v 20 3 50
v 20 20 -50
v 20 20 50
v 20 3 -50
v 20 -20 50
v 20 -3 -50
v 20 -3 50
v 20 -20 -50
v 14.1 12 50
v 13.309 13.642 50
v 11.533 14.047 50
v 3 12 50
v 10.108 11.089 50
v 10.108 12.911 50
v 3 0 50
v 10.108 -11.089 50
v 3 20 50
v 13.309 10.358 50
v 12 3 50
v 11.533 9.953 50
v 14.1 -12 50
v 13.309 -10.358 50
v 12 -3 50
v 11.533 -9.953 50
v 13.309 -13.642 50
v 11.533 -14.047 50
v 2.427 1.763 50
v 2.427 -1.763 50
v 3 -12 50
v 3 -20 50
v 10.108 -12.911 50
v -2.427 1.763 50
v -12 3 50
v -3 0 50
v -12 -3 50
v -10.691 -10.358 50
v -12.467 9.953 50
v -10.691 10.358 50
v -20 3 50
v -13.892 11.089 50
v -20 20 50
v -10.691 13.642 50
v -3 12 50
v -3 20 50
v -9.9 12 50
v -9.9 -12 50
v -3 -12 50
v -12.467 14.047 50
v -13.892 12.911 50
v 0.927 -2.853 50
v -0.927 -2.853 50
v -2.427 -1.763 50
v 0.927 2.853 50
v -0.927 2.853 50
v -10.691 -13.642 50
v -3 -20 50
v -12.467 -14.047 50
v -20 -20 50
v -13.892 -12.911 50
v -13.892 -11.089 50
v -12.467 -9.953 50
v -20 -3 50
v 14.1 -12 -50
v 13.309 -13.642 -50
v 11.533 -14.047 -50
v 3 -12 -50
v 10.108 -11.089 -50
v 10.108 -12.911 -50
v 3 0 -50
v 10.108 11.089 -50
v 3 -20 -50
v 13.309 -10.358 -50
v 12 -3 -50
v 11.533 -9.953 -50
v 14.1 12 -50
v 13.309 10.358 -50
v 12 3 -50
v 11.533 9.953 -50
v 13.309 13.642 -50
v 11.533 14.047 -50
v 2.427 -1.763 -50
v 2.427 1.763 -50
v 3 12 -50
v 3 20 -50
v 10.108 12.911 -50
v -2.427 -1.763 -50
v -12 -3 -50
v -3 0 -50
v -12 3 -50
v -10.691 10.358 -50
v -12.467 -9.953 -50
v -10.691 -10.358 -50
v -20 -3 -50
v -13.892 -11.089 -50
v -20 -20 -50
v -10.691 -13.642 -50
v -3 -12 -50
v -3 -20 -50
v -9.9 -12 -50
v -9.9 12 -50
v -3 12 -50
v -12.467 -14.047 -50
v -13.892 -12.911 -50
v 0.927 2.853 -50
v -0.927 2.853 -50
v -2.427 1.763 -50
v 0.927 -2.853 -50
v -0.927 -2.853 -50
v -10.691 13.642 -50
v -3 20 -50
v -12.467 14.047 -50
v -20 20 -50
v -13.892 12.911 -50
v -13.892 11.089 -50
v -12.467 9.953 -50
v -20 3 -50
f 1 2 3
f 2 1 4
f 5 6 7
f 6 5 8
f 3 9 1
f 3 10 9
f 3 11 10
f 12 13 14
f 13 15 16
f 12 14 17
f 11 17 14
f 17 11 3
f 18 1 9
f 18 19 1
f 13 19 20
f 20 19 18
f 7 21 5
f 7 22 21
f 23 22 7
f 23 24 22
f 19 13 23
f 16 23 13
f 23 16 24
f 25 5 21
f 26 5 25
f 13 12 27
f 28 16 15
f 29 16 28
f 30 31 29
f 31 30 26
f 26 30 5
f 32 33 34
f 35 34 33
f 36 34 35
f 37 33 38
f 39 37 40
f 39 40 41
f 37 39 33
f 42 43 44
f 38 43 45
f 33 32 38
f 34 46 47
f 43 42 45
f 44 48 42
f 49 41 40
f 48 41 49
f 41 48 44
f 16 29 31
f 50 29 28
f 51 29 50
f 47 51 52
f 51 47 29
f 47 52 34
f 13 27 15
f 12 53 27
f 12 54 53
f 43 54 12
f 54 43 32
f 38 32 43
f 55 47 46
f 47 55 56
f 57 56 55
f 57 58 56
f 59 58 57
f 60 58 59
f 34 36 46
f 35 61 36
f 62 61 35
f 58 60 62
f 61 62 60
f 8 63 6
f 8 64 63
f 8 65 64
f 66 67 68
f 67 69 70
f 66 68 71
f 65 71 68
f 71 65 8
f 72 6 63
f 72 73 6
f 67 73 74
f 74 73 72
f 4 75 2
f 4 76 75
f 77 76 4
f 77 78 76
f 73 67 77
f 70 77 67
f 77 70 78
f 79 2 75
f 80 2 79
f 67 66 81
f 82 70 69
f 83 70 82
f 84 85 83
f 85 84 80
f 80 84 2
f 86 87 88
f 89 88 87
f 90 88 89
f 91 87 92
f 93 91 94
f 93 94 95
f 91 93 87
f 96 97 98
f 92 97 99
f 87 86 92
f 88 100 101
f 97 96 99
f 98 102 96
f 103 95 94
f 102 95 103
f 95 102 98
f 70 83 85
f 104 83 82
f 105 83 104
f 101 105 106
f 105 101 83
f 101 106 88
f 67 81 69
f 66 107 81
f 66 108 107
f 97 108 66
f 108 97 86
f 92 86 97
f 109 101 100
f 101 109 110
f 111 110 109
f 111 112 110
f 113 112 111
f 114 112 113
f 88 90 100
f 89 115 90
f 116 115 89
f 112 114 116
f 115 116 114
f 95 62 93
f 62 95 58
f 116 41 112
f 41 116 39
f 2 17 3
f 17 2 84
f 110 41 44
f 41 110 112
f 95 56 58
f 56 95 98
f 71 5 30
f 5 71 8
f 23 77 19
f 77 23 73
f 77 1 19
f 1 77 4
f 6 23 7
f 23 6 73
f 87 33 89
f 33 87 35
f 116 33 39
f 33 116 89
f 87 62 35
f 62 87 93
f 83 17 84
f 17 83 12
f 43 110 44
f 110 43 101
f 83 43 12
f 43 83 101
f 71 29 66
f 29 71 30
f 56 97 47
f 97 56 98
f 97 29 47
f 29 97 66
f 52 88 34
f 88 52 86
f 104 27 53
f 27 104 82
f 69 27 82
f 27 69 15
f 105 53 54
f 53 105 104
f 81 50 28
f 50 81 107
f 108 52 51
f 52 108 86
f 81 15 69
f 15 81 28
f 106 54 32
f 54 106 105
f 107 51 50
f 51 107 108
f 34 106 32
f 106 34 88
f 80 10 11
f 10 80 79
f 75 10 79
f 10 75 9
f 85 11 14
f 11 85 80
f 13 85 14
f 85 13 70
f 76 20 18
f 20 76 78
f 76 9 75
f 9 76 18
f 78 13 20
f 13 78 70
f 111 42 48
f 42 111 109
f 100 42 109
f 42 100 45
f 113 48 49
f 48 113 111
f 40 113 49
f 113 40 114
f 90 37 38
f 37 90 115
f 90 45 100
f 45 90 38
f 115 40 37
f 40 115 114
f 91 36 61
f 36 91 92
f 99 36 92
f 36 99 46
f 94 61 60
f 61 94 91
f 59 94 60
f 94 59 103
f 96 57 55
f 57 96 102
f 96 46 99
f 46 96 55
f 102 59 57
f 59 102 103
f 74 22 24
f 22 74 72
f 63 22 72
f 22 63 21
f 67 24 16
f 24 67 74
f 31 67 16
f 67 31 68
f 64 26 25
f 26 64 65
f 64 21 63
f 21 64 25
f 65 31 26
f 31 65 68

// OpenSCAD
// Parameters
cross_section_width_mm = 40; //[20:80:1]
cross_section_height_mm = 40; //[20:80:1]
length_mm = 100; //[50:200:1]
wall_thickness_mm = 2.5; //[1.2:5:0.1]
slot_opening_mm = 6; //[3:12:0.5]
slot_depth_mm = 8; //[4:16:0.5]
center_hole_d_mm = 6; //[0:12:0.5]
corner_hole_d_mm = 4.2; //[0:10:0.2]
corner_hole_offset_mm = 8; //[4:16:0.5]
overlap_mm = 1; //[0.5:2:0.1]

// Extrusion - complete detailed geometry
module extrusion() {
  color("Silver") {
    difference() {
      cube([cross_section_width_mm, cross_section_height_mm, length_mm], center=true);
      // Slots
      translate([cross_section_width_mm/2 - slot_depth_mm/2 + overlap_mm, 0, 0])
        cube([slot_depth_mm + overlap_mm*2, slot_opening_mm, length_mm + overlap_mm*2], center=true);
      translate([-(cross_section_width_mm/2 - slot_depth_mm/2 + overlap_mm), 0, 0])
        cube([slot_depth_mm + overlap_mm*2, slot_opening_mm, length_mm + overlap_mm*2], center=true);
      translate([0, cross_section_height_mm/2 - slot_depth_mm/2 + overlap_mm, 0])
        cube([slot_opening_mm, slot_depth_mm + overlap_mm*2, length_mm + overlap_mm*2], center=true);
      translate([0, -(cross_section_height_mm/2 - slot_depth_mm/2 + overlap_mm), 0])
        cube([slot_opening_mm, slot_depth_mm + overlap_mm*2, length_mm + overlap_mm*2], center=true);
      // Center hole
      translate([0, 0, 0])
        cylinder(r=center_hole_d_mm/2, h=length_mm + overlap_mm*2, center=true);
      // Corner holes
      translate([cross_section_width_mm/2 - corner_hole_offset_mm, cross_section_height_mm/2 - corner_hole_offset_mm, 0])
        cylinder(r=corner_hole_d_mm/2, h=length_mm + overlap_mm*2, center=true);
      translate([-(cross_section_width_mm/2 - corner_hole_offset_mm), cross_section_height_mm/2 - corner_hole_offset_mm, 0])
        cylinder(r=corner_hole_d_mm/2, h=length_mm + overlap_mm*2, center=true);
      translate([-(cross_section_width_mm/2 - corner_hole_offset_mm), -(cross_section_height_mm/2 - corner_hole_offset_mm), 0])
        cylinder(r=corner_hole_d_mm/2, h=length_mm + overlap_mm*2, center=true);
      translate([cross_section_width_mm/2 - corner_hole_offset_mm, -(cross_section_height_mm/2 - corner_hole_offset_mm), 0])
        cylinder(r=corner_hole_d_mm/2, h=length_mm + overlap_mm*2, center=true);
    }
  }
}

// Box Corner Profile Sections - complete detailed geometry
module box_corner_profile_sections() {
  color("DimGray") {
    // Corner reinforcement blocks
    translate([cross_section_width_mm/2 - wall_thickness_mm/2, cross_section_height_mm/2 - wall_thickness_mm/2, 0])
      cube([wall_thickness_mm, wall_thickness_mm, length_mm], center=true);
    translate([-(cross_section_width_mm/2 - wall_thickness_mm/2), cross_section_height_mm/2 - wall_thickness_mm/2, 0])
      cube([wall_thickness_mm, wall_thickness_mm, length_mm], center=true);
    translate([-(cross_section_width_mm/2 - wall_thickness_mm/2), -(cross_section_height_mm/2 - wall_thickness_mm/2), 0])
      cube([wall_thickness_mm, wall_thickness_mm, length_mm], center=true);
    translate([cross_section_width_mm/2 - wall_thickness_mm/2, -(cross_section_height_mm/2 - wall_thickness_mm/2), 0])
      cube([wall_thickness_mm, wall_thickness_mm, length_mm], center=true);
  }
}

// Assembly
module assembly() {
  extrusion();
  box_corner_profile_sections();
}

assembly();
